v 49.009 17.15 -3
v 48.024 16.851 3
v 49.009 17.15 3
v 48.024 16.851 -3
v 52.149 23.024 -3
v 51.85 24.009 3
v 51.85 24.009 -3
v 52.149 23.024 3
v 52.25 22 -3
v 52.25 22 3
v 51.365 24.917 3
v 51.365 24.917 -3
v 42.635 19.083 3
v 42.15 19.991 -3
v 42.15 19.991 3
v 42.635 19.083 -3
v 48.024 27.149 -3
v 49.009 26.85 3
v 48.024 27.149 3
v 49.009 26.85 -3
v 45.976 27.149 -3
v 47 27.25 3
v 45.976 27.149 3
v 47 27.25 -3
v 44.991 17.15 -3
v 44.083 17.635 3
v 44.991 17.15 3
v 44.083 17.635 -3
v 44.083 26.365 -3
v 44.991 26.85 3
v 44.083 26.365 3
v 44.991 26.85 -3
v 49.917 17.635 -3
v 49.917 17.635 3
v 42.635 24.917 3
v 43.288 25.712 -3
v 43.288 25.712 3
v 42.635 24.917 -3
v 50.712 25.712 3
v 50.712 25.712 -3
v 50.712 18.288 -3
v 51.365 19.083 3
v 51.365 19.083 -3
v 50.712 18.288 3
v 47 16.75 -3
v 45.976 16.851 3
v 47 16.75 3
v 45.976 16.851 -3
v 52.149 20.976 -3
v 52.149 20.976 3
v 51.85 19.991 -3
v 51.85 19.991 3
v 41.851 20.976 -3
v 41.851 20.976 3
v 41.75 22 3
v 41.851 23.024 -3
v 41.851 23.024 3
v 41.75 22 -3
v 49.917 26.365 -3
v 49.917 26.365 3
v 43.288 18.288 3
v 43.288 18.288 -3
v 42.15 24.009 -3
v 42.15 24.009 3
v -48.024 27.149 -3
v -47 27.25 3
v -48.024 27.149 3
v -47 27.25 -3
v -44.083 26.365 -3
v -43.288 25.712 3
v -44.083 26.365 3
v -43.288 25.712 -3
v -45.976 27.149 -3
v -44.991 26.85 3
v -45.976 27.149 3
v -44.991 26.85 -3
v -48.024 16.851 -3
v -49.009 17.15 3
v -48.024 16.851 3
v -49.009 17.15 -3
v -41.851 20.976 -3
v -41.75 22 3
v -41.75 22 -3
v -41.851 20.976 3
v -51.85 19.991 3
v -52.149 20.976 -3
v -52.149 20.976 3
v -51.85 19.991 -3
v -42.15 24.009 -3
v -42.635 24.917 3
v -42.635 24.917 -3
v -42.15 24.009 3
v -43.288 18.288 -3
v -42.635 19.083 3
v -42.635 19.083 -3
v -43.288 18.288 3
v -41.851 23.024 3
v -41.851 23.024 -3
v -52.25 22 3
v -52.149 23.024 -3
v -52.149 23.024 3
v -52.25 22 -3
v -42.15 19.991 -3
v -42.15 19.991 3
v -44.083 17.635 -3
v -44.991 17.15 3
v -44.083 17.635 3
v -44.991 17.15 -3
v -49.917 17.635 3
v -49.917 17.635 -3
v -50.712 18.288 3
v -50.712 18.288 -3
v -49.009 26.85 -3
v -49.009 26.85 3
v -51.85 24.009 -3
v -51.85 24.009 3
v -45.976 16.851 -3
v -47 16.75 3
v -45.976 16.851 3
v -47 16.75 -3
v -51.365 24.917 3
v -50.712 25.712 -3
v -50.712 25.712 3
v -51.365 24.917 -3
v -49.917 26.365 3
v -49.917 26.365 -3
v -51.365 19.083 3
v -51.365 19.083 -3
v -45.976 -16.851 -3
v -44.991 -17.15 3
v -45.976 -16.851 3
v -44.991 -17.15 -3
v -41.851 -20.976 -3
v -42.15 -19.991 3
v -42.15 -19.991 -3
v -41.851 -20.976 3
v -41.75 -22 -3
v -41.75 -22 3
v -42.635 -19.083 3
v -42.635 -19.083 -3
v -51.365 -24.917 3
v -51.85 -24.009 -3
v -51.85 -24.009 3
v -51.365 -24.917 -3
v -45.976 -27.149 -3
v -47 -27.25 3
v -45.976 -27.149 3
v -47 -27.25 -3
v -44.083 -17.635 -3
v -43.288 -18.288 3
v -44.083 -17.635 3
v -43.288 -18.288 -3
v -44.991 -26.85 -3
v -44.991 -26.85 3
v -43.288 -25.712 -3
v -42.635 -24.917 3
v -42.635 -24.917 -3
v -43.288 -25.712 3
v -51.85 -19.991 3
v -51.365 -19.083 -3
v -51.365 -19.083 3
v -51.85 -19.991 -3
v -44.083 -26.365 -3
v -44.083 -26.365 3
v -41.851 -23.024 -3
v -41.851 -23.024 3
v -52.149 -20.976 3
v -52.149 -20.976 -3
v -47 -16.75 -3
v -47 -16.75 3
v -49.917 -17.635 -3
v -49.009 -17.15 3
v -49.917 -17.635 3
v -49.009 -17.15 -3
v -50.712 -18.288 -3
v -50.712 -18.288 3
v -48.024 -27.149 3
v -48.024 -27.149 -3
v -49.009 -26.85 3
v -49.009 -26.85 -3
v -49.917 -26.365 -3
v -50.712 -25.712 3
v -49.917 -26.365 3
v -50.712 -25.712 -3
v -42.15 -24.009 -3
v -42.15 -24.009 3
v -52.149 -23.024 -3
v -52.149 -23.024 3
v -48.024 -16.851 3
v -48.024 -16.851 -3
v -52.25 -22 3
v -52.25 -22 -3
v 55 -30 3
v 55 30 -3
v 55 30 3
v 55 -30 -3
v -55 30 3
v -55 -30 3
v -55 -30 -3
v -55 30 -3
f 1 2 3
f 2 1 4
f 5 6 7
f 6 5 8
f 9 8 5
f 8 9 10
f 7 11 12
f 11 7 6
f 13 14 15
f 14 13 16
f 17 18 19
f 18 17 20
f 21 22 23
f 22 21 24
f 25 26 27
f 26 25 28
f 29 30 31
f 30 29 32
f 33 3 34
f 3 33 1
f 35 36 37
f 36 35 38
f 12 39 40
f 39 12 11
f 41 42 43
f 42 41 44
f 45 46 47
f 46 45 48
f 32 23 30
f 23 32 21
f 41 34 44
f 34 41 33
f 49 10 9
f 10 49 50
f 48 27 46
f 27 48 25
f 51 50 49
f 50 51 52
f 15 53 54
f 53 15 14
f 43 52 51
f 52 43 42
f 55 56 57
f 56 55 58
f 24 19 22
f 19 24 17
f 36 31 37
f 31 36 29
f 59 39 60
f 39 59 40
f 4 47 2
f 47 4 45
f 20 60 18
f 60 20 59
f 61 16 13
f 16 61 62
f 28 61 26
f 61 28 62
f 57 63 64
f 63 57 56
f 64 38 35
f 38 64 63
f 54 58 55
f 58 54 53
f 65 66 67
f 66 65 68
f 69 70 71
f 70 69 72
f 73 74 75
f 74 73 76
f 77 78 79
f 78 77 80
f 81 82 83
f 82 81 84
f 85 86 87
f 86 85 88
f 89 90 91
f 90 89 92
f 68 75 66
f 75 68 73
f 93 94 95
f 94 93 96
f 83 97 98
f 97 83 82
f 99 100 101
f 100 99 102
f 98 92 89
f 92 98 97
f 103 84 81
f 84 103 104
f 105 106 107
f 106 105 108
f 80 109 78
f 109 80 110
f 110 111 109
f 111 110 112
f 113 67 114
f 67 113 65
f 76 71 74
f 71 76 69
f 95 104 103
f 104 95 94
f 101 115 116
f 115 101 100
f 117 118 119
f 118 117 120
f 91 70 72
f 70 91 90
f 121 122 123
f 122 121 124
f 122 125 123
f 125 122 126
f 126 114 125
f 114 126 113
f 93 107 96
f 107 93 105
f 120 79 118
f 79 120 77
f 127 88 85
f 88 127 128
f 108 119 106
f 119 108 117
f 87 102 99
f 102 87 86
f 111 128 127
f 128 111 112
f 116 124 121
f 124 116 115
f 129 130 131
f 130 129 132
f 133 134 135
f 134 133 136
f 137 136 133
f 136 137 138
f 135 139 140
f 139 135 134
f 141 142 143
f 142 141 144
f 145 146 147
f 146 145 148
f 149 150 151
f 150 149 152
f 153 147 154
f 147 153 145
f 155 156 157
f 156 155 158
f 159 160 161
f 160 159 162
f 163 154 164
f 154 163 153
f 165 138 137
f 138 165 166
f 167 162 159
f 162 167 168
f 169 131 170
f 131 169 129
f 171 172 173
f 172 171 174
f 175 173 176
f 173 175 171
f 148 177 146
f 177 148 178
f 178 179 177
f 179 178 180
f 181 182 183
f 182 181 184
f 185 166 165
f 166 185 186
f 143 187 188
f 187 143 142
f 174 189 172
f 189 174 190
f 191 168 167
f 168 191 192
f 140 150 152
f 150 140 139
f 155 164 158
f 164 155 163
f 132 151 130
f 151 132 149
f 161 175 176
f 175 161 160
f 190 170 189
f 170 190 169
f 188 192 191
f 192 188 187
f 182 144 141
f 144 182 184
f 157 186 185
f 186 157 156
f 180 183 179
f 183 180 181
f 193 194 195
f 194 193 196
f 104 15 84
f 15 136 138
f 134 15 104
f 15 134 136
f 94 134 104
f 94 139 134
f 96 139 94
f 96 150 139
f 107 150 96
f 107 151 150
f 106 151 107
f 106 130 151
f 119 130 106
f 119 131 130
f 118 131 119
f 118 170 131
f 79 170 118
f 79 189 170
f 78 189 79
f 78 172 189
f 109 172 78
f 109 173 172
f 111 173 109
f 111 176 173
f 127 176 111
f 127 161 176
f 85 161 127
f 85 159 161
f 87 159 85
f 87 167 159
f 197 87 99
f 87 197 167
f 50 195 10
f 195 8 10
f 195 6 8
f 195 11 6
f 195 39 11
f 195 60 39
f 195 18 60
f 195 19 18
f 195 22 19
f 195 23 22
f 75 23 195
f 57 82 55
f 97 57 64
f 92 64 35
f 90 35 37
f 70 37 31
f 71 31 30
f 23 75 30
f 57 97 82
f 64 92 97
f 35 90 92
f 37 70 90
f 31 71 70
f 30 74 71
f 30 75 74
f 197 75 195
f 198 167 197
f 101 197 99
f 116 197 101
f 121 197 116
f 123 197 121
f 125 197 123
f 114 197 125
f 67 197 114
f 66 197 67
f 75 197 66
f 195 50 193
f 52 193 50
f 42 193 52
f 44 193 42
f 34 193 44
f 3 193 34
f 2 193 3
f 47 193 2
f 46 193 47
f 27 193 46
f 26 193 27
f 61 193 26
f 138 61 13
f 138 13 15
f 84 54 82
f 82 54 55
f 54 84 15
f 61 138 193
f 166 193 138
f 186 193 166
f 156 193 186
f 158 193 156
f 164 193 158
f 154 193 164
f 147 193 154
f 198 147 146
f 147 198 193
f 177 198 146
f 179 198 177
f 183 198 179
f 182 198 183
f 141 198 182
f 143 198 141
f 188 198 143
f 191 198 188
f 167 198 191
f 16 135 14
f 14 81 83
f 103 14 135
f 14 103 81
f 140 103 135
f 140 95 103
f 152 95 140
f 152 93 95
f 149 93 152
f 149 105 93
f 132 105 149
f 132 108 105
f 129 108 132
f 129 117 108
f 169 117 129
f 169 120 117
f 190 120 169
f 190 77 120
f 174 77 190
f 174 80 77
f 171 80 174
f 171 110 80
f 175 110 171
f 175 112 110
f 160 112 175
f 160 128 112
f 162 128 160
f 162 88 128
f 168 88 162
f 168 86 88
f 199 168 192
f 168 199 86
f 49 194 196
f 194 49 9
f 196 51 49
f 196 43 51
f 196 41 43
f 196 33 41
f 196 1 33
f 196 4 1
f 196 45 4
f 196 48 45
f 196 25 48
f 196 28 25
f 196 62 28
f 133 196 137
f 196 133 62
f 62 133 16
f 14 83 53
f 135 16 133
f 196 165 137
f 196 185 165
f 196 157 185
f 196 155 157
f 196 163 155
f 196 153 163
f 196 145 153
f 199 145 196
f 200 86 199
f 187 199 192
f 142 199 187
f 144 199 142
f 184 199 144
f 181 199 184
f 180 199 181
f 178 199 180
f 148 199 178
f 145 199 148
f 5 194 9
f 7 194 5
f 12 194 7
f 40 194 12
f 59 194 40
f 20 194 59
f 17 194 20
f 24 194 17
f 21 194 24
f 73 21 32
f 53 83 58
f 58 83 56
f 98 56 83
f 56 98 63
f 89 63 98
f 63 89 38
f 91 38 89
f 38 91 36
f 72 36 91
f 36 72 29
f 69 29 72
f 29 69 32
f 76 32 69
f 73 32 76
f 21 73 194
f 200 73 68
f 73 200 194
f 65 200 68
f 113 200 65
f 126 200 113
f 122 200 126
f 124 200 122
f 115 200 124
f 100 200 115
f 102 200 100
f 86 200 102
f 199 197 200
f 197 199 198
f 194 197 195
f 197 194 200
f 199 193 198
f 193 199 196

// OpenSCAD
$fn = 32;

// ----------------------------------------------------------------------
// Corner plate 110 x 60 x 6
// 3 holes, centres taken from the edge offset
// ----------------------------------------------------------------------

// --- parameters (mm) ---
plate = [110, 60, 6];  // overall size (x, y, z)
holes = 3;             // number of holes the drawing asks for
hole_d = 10.5;         // hole diameter
edge = 8;              // hole centre offset from the plate edge

// --- derived feature positions (mm) ---
corner_x = plate[0] / 2 - edge;  // = 47   corner hole X
corner_y = plate[1] / 2 - edge;  // = 22   corner hole Y
feature_centers = [
  [corner_x, corner_y],
  [-corner_x, corner_y],
  [-corner_x, -corner_y]
];   // hole centres the loop below drills

// plate outline, every hole drilled through with the same cutters
difference() {
  cube(plate, center = true);
  for (centre = feature_centers)
    translate([centre[0], centre[1], 0])
      cylinder(d = hole_d, h = plate[2] + 2, center = true);
}
